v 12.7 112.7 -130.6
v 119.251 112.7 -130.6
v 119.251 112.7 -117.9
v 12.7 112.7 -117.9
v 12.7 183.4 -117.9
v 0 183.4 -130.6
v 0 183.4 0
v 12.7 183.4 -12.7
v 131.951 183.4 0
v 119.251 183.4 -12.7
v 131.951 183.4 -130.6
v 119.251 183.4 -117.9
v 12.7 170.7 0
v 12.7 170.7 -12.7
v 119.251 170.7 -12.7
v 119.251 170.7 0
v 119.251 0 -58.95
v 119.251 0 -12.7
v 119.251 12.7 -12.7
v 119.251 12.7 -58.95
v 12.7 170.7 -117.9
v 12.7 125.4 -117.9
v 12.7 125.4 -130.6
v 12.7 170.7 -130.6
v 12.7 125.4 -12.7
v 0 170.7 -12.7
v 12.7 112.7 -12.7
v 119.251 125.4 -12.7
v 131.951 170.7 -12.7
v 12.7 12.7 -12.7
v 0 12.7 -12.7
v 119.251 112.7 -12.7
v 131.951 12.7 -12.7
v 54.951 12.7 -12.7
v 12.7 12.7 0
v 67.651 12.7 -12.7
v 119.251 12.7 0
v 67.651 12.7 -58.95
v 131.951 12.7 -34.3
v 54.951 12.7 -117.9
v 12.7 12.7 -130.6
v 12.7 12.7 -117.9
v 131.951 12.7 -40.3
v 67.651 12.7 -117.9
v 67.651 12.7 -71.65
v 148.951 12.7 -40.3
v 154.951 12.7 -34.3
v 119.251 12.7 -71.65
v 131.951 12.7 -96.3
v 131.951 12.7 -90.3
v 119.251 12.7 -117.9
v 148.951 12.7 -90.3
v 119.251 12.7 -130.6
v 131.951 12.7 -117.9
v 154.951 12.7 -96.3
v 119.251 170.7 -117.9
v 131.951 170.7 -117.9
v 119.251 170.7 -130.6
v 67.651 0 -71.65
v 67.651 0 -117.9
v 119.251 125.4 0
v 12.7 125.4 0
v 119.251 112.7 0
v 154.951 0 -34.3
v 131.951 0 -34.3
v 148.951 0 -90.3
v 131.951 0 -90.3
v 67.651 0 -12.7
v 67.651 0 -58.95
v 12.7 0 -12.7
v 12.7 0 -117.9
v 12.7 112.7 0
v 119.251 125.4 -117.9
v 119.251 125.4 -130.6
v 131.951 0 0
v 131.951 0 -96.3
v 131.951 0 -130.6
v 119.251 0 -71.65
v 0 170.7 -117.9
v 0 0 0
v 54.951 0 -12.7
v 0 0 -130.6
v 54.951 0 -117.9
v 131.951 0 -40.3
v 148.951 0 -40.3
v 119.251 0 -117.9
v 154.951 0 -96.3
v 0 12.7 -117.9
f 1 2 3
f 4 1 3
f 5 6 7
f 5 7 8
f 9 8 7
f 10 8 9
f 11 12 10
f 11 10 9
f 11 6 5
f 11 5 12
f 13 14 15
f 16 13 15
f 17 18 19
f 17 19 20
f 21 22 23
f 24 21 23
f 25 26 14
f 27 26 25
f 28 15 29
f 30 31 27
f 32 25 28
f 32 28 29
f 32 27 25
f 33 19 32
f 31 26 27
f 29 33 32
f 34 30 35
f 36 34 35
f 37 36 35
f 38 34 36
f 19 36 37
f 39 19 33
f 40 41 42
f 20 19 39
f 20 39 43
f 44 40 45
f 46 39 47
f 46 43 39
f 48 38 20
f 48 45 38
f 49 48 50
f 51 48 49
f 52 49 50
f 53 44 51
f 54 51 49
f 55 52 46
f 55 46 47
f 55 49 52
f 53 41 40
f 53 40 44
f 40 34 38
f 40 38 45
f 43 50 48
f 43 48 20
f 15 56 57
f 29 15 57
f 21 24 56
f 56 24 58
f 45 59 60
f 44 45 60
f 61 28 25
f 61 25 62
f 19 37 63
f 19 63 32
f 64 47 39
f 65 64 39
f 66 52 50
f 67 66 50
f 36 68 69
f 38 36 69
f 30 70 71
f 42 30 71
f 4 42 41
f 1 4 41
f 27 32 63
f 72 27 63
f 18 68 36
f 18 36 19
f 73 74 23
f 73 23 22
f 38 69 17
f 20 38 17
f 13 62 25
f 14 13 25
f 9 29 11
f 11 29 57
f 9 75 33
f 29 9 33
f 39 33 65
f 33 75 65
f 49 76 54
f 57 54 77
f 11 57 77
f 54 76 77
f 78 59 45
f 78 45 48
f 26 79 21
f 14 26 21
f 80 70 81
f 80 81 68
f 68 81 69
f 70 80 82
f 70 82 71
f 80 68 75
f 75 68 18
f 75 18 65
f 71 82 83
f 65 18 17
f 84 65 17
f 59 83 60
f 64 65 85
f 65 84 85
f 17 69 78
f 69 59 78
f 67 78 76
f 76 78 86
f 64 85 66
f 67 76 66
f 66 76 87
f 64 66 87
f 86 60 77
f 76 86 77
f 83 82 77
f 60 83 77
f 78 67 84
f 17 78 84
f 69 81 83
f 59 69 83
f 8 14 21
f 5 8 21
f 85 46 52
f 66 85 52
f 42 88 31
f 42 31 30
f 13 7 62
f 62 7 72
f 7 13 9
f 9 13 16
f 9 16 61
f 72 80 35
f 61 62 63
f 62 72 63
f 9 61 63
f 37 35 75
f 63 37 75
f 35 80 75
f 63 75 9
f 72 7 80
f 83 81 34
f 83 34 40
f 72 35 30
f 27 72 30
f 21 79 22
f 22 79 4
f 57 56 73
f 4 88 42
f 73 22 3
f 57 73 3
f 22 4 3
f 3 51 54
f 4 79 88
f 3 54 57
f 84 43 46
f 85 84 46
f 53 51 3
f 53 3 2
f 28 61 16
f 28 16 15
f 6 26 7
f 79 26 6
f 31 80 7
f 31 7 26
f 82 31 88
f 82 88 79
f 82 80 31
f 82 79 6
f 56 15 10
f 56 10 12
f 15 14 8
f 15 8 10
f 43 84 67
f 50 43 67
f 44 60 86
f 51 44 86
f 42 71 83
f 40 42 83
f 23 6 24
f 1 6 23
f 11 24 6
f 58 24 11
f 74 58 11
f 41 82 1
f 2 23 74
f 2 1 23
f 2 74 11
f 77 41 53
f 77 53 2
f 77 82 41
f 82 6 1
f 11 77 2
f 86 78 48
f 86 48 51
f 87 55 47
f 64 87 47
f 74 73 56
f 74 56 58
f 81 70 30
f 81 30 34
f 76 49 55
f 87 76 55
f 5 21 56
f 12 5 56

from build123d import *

# Parameters (mm, degrees)
CROQUIS1_W              = 131.9512
CROQUIS1_H              = 130.6
CROQUIS1_W_2            = 42.2512
CROQUIS1_H_2            = 105.2
CROQUIS1_W_3            = 51.6
CROQUIS1_H_3            = 46.25
SALIENTE_EXTRUIR1_DEPTH = 12.7
CROQUIS2_W              = 12.7
CROQUIS2_H              = 12.7
SALIENTE_EXTRUIR2_DEPTH = 158
CROQUIS3_W              = 131.9512
CROQUIS3_H              = 130.6
CROQUIS3_W_2            = 106.5512
CROQUIS3_H_2            = 105.2
SALIENTE_EXTRUIR3_DEPTH = 12.7
SALIENTE_EXTRUIR4_REACH = 256.78
CROQUIS4_W              = 12.7
CROQUIS4_H              = 12.7
SALIENTE_EXTRUIR5_DEPTH = 12.7


with BuildPart() as part:
    # Croquis1 → Saliente-Extruir1 (new body)
    with BuildSketch(Plane(origin=(0, 0, 0), x_dir=(1, 0, 0), z_dir=(0, 1, 0))):
        with Locations((65.9756, 65.3)):
            Rectangle(CROQUIS1_W, CROQUIS1_H)
        with Locations((33.8256, 65.3)):
            Rectangle(CROQUIS1_W_2, CROQUIS1_H_2, mode=Mode.SUBTRACT)
        with Locations((93.4512, 35.825)):
            Rectangle(CROQUIS1_W_3, CROQUIS1_H_3, mode=Mode.SUBTRACT)
        with Locations((93.4512, 94.775)):
            Rectangle(CROQUIS1_W_3, CROQUIS1_H_3, mode=Mode.SUBTRACT)
    extrude(amount=SALIENTE_EXTRUIR1_DEPTH)

    # Croquis2 → Saliente-Extruir2 (add)
    with BuildSketch(Plane(origin=(0, 12.7, 0), x_dir=(1, 0, 0), z_dir=(0, 1, 0))):
        with Locations((6.35, 124.25)):
            Rectangle(CROQUIS2_W, CROQUIS2_H)
        with Locations((6.35, 6.35)):
            Rectangle(CROQUIS2_W, CROQUIS2_H)
        with Locations((125.6012, 124.25)):
            Rectangle(CROQUIS2_W, CROQUIS2_H)
        with Locations((125.6012, 6.35)):
            Rectangle(CROQUIS2_W, CROQUIS2_H)
    extrude(amount=SALIENTE_EXTRUIR2_DEPTH)

    # Croquis3 → Saliente-Extruir3 (add)
    with BuildSketch(Plane(origin=(0, 170.7, 0), x_dir=(1, 0, 0), z_dir=(0, 1, 0))):
        with Locations((65.9756, 65.3)):
            Rectangle(CROQUIS3_W, CROQUIS3_H)
        with Locations((65.9756, 65.3)):
            Rectangle(CROQUIS3_W_2, CROQUIS3_H_2, mode=Mode.SUBTRACT)
    extrude(amount=SALIENTE_EXTRUIR3_DEPTH)

    # Croquis4 → Saliente-Extruir4 (add, up to next)
    with BuildSketch(Plane.ZY.offset(-119.2512), mode=Mode.PRIVATE) as saliente_extruir4_sk1:
        with Locations((-6.35, 119.05)):
            Rectangle(CROQUIS4_W, CROQUIS4_H)
    saliente_extruir4_tool1 = extrude(saliente_extruir4_sk1.sketch, amount=SALIENTE_EXTRUIR4_REACH, mode=Mode.PRIVATE) - part.part
    # Croquis4 → Saliente-Extruir4 (add, up to next)
    with BuildSketch(Plane.ZY.offset(-119.2512), mode=Mode.PRIVATE) as saliente_extruir4_sk2:
        with Locations((-124.25, 119.05)):
            Rectangle(CROQUIS4_W, CROQUIS4_H)
    saliente_extruir4_tool2 = extrude(saliente_extruir4_sk2.sketch, amount=SALIENTE_EXTRUIR4_REACH, mode=Mode.PRIVATE) - part.part
    add(saliente_extruir4_tool1.solids().sort_by_distance((119.2512, 119.05, -6.35))[0])
    add(saliente_extruir4_tool2.solids().sort_by_distance((119.2512, 119.05, -124.25))[0])

    # Croquis5 → Saliente-Extruir5 (add)
    with BuildSketch(Plane(origin=(0, 12.7, 0), x_dir=(1, 0, 0), z_dir=(0, 1, 0))):
        Polygon((131.9512, 96.3), (154.9512, 96.3), (154.9512, 34.3), (131.9512, 34.3), (131.9512, 40.3), (148.9512, 40.3), (148.9512, 90.3), (131.9512, 90.3), align=None)
    extrude(amount=-SALIENTE_EXTRUIR5_DEPTH)


solid = part.part
